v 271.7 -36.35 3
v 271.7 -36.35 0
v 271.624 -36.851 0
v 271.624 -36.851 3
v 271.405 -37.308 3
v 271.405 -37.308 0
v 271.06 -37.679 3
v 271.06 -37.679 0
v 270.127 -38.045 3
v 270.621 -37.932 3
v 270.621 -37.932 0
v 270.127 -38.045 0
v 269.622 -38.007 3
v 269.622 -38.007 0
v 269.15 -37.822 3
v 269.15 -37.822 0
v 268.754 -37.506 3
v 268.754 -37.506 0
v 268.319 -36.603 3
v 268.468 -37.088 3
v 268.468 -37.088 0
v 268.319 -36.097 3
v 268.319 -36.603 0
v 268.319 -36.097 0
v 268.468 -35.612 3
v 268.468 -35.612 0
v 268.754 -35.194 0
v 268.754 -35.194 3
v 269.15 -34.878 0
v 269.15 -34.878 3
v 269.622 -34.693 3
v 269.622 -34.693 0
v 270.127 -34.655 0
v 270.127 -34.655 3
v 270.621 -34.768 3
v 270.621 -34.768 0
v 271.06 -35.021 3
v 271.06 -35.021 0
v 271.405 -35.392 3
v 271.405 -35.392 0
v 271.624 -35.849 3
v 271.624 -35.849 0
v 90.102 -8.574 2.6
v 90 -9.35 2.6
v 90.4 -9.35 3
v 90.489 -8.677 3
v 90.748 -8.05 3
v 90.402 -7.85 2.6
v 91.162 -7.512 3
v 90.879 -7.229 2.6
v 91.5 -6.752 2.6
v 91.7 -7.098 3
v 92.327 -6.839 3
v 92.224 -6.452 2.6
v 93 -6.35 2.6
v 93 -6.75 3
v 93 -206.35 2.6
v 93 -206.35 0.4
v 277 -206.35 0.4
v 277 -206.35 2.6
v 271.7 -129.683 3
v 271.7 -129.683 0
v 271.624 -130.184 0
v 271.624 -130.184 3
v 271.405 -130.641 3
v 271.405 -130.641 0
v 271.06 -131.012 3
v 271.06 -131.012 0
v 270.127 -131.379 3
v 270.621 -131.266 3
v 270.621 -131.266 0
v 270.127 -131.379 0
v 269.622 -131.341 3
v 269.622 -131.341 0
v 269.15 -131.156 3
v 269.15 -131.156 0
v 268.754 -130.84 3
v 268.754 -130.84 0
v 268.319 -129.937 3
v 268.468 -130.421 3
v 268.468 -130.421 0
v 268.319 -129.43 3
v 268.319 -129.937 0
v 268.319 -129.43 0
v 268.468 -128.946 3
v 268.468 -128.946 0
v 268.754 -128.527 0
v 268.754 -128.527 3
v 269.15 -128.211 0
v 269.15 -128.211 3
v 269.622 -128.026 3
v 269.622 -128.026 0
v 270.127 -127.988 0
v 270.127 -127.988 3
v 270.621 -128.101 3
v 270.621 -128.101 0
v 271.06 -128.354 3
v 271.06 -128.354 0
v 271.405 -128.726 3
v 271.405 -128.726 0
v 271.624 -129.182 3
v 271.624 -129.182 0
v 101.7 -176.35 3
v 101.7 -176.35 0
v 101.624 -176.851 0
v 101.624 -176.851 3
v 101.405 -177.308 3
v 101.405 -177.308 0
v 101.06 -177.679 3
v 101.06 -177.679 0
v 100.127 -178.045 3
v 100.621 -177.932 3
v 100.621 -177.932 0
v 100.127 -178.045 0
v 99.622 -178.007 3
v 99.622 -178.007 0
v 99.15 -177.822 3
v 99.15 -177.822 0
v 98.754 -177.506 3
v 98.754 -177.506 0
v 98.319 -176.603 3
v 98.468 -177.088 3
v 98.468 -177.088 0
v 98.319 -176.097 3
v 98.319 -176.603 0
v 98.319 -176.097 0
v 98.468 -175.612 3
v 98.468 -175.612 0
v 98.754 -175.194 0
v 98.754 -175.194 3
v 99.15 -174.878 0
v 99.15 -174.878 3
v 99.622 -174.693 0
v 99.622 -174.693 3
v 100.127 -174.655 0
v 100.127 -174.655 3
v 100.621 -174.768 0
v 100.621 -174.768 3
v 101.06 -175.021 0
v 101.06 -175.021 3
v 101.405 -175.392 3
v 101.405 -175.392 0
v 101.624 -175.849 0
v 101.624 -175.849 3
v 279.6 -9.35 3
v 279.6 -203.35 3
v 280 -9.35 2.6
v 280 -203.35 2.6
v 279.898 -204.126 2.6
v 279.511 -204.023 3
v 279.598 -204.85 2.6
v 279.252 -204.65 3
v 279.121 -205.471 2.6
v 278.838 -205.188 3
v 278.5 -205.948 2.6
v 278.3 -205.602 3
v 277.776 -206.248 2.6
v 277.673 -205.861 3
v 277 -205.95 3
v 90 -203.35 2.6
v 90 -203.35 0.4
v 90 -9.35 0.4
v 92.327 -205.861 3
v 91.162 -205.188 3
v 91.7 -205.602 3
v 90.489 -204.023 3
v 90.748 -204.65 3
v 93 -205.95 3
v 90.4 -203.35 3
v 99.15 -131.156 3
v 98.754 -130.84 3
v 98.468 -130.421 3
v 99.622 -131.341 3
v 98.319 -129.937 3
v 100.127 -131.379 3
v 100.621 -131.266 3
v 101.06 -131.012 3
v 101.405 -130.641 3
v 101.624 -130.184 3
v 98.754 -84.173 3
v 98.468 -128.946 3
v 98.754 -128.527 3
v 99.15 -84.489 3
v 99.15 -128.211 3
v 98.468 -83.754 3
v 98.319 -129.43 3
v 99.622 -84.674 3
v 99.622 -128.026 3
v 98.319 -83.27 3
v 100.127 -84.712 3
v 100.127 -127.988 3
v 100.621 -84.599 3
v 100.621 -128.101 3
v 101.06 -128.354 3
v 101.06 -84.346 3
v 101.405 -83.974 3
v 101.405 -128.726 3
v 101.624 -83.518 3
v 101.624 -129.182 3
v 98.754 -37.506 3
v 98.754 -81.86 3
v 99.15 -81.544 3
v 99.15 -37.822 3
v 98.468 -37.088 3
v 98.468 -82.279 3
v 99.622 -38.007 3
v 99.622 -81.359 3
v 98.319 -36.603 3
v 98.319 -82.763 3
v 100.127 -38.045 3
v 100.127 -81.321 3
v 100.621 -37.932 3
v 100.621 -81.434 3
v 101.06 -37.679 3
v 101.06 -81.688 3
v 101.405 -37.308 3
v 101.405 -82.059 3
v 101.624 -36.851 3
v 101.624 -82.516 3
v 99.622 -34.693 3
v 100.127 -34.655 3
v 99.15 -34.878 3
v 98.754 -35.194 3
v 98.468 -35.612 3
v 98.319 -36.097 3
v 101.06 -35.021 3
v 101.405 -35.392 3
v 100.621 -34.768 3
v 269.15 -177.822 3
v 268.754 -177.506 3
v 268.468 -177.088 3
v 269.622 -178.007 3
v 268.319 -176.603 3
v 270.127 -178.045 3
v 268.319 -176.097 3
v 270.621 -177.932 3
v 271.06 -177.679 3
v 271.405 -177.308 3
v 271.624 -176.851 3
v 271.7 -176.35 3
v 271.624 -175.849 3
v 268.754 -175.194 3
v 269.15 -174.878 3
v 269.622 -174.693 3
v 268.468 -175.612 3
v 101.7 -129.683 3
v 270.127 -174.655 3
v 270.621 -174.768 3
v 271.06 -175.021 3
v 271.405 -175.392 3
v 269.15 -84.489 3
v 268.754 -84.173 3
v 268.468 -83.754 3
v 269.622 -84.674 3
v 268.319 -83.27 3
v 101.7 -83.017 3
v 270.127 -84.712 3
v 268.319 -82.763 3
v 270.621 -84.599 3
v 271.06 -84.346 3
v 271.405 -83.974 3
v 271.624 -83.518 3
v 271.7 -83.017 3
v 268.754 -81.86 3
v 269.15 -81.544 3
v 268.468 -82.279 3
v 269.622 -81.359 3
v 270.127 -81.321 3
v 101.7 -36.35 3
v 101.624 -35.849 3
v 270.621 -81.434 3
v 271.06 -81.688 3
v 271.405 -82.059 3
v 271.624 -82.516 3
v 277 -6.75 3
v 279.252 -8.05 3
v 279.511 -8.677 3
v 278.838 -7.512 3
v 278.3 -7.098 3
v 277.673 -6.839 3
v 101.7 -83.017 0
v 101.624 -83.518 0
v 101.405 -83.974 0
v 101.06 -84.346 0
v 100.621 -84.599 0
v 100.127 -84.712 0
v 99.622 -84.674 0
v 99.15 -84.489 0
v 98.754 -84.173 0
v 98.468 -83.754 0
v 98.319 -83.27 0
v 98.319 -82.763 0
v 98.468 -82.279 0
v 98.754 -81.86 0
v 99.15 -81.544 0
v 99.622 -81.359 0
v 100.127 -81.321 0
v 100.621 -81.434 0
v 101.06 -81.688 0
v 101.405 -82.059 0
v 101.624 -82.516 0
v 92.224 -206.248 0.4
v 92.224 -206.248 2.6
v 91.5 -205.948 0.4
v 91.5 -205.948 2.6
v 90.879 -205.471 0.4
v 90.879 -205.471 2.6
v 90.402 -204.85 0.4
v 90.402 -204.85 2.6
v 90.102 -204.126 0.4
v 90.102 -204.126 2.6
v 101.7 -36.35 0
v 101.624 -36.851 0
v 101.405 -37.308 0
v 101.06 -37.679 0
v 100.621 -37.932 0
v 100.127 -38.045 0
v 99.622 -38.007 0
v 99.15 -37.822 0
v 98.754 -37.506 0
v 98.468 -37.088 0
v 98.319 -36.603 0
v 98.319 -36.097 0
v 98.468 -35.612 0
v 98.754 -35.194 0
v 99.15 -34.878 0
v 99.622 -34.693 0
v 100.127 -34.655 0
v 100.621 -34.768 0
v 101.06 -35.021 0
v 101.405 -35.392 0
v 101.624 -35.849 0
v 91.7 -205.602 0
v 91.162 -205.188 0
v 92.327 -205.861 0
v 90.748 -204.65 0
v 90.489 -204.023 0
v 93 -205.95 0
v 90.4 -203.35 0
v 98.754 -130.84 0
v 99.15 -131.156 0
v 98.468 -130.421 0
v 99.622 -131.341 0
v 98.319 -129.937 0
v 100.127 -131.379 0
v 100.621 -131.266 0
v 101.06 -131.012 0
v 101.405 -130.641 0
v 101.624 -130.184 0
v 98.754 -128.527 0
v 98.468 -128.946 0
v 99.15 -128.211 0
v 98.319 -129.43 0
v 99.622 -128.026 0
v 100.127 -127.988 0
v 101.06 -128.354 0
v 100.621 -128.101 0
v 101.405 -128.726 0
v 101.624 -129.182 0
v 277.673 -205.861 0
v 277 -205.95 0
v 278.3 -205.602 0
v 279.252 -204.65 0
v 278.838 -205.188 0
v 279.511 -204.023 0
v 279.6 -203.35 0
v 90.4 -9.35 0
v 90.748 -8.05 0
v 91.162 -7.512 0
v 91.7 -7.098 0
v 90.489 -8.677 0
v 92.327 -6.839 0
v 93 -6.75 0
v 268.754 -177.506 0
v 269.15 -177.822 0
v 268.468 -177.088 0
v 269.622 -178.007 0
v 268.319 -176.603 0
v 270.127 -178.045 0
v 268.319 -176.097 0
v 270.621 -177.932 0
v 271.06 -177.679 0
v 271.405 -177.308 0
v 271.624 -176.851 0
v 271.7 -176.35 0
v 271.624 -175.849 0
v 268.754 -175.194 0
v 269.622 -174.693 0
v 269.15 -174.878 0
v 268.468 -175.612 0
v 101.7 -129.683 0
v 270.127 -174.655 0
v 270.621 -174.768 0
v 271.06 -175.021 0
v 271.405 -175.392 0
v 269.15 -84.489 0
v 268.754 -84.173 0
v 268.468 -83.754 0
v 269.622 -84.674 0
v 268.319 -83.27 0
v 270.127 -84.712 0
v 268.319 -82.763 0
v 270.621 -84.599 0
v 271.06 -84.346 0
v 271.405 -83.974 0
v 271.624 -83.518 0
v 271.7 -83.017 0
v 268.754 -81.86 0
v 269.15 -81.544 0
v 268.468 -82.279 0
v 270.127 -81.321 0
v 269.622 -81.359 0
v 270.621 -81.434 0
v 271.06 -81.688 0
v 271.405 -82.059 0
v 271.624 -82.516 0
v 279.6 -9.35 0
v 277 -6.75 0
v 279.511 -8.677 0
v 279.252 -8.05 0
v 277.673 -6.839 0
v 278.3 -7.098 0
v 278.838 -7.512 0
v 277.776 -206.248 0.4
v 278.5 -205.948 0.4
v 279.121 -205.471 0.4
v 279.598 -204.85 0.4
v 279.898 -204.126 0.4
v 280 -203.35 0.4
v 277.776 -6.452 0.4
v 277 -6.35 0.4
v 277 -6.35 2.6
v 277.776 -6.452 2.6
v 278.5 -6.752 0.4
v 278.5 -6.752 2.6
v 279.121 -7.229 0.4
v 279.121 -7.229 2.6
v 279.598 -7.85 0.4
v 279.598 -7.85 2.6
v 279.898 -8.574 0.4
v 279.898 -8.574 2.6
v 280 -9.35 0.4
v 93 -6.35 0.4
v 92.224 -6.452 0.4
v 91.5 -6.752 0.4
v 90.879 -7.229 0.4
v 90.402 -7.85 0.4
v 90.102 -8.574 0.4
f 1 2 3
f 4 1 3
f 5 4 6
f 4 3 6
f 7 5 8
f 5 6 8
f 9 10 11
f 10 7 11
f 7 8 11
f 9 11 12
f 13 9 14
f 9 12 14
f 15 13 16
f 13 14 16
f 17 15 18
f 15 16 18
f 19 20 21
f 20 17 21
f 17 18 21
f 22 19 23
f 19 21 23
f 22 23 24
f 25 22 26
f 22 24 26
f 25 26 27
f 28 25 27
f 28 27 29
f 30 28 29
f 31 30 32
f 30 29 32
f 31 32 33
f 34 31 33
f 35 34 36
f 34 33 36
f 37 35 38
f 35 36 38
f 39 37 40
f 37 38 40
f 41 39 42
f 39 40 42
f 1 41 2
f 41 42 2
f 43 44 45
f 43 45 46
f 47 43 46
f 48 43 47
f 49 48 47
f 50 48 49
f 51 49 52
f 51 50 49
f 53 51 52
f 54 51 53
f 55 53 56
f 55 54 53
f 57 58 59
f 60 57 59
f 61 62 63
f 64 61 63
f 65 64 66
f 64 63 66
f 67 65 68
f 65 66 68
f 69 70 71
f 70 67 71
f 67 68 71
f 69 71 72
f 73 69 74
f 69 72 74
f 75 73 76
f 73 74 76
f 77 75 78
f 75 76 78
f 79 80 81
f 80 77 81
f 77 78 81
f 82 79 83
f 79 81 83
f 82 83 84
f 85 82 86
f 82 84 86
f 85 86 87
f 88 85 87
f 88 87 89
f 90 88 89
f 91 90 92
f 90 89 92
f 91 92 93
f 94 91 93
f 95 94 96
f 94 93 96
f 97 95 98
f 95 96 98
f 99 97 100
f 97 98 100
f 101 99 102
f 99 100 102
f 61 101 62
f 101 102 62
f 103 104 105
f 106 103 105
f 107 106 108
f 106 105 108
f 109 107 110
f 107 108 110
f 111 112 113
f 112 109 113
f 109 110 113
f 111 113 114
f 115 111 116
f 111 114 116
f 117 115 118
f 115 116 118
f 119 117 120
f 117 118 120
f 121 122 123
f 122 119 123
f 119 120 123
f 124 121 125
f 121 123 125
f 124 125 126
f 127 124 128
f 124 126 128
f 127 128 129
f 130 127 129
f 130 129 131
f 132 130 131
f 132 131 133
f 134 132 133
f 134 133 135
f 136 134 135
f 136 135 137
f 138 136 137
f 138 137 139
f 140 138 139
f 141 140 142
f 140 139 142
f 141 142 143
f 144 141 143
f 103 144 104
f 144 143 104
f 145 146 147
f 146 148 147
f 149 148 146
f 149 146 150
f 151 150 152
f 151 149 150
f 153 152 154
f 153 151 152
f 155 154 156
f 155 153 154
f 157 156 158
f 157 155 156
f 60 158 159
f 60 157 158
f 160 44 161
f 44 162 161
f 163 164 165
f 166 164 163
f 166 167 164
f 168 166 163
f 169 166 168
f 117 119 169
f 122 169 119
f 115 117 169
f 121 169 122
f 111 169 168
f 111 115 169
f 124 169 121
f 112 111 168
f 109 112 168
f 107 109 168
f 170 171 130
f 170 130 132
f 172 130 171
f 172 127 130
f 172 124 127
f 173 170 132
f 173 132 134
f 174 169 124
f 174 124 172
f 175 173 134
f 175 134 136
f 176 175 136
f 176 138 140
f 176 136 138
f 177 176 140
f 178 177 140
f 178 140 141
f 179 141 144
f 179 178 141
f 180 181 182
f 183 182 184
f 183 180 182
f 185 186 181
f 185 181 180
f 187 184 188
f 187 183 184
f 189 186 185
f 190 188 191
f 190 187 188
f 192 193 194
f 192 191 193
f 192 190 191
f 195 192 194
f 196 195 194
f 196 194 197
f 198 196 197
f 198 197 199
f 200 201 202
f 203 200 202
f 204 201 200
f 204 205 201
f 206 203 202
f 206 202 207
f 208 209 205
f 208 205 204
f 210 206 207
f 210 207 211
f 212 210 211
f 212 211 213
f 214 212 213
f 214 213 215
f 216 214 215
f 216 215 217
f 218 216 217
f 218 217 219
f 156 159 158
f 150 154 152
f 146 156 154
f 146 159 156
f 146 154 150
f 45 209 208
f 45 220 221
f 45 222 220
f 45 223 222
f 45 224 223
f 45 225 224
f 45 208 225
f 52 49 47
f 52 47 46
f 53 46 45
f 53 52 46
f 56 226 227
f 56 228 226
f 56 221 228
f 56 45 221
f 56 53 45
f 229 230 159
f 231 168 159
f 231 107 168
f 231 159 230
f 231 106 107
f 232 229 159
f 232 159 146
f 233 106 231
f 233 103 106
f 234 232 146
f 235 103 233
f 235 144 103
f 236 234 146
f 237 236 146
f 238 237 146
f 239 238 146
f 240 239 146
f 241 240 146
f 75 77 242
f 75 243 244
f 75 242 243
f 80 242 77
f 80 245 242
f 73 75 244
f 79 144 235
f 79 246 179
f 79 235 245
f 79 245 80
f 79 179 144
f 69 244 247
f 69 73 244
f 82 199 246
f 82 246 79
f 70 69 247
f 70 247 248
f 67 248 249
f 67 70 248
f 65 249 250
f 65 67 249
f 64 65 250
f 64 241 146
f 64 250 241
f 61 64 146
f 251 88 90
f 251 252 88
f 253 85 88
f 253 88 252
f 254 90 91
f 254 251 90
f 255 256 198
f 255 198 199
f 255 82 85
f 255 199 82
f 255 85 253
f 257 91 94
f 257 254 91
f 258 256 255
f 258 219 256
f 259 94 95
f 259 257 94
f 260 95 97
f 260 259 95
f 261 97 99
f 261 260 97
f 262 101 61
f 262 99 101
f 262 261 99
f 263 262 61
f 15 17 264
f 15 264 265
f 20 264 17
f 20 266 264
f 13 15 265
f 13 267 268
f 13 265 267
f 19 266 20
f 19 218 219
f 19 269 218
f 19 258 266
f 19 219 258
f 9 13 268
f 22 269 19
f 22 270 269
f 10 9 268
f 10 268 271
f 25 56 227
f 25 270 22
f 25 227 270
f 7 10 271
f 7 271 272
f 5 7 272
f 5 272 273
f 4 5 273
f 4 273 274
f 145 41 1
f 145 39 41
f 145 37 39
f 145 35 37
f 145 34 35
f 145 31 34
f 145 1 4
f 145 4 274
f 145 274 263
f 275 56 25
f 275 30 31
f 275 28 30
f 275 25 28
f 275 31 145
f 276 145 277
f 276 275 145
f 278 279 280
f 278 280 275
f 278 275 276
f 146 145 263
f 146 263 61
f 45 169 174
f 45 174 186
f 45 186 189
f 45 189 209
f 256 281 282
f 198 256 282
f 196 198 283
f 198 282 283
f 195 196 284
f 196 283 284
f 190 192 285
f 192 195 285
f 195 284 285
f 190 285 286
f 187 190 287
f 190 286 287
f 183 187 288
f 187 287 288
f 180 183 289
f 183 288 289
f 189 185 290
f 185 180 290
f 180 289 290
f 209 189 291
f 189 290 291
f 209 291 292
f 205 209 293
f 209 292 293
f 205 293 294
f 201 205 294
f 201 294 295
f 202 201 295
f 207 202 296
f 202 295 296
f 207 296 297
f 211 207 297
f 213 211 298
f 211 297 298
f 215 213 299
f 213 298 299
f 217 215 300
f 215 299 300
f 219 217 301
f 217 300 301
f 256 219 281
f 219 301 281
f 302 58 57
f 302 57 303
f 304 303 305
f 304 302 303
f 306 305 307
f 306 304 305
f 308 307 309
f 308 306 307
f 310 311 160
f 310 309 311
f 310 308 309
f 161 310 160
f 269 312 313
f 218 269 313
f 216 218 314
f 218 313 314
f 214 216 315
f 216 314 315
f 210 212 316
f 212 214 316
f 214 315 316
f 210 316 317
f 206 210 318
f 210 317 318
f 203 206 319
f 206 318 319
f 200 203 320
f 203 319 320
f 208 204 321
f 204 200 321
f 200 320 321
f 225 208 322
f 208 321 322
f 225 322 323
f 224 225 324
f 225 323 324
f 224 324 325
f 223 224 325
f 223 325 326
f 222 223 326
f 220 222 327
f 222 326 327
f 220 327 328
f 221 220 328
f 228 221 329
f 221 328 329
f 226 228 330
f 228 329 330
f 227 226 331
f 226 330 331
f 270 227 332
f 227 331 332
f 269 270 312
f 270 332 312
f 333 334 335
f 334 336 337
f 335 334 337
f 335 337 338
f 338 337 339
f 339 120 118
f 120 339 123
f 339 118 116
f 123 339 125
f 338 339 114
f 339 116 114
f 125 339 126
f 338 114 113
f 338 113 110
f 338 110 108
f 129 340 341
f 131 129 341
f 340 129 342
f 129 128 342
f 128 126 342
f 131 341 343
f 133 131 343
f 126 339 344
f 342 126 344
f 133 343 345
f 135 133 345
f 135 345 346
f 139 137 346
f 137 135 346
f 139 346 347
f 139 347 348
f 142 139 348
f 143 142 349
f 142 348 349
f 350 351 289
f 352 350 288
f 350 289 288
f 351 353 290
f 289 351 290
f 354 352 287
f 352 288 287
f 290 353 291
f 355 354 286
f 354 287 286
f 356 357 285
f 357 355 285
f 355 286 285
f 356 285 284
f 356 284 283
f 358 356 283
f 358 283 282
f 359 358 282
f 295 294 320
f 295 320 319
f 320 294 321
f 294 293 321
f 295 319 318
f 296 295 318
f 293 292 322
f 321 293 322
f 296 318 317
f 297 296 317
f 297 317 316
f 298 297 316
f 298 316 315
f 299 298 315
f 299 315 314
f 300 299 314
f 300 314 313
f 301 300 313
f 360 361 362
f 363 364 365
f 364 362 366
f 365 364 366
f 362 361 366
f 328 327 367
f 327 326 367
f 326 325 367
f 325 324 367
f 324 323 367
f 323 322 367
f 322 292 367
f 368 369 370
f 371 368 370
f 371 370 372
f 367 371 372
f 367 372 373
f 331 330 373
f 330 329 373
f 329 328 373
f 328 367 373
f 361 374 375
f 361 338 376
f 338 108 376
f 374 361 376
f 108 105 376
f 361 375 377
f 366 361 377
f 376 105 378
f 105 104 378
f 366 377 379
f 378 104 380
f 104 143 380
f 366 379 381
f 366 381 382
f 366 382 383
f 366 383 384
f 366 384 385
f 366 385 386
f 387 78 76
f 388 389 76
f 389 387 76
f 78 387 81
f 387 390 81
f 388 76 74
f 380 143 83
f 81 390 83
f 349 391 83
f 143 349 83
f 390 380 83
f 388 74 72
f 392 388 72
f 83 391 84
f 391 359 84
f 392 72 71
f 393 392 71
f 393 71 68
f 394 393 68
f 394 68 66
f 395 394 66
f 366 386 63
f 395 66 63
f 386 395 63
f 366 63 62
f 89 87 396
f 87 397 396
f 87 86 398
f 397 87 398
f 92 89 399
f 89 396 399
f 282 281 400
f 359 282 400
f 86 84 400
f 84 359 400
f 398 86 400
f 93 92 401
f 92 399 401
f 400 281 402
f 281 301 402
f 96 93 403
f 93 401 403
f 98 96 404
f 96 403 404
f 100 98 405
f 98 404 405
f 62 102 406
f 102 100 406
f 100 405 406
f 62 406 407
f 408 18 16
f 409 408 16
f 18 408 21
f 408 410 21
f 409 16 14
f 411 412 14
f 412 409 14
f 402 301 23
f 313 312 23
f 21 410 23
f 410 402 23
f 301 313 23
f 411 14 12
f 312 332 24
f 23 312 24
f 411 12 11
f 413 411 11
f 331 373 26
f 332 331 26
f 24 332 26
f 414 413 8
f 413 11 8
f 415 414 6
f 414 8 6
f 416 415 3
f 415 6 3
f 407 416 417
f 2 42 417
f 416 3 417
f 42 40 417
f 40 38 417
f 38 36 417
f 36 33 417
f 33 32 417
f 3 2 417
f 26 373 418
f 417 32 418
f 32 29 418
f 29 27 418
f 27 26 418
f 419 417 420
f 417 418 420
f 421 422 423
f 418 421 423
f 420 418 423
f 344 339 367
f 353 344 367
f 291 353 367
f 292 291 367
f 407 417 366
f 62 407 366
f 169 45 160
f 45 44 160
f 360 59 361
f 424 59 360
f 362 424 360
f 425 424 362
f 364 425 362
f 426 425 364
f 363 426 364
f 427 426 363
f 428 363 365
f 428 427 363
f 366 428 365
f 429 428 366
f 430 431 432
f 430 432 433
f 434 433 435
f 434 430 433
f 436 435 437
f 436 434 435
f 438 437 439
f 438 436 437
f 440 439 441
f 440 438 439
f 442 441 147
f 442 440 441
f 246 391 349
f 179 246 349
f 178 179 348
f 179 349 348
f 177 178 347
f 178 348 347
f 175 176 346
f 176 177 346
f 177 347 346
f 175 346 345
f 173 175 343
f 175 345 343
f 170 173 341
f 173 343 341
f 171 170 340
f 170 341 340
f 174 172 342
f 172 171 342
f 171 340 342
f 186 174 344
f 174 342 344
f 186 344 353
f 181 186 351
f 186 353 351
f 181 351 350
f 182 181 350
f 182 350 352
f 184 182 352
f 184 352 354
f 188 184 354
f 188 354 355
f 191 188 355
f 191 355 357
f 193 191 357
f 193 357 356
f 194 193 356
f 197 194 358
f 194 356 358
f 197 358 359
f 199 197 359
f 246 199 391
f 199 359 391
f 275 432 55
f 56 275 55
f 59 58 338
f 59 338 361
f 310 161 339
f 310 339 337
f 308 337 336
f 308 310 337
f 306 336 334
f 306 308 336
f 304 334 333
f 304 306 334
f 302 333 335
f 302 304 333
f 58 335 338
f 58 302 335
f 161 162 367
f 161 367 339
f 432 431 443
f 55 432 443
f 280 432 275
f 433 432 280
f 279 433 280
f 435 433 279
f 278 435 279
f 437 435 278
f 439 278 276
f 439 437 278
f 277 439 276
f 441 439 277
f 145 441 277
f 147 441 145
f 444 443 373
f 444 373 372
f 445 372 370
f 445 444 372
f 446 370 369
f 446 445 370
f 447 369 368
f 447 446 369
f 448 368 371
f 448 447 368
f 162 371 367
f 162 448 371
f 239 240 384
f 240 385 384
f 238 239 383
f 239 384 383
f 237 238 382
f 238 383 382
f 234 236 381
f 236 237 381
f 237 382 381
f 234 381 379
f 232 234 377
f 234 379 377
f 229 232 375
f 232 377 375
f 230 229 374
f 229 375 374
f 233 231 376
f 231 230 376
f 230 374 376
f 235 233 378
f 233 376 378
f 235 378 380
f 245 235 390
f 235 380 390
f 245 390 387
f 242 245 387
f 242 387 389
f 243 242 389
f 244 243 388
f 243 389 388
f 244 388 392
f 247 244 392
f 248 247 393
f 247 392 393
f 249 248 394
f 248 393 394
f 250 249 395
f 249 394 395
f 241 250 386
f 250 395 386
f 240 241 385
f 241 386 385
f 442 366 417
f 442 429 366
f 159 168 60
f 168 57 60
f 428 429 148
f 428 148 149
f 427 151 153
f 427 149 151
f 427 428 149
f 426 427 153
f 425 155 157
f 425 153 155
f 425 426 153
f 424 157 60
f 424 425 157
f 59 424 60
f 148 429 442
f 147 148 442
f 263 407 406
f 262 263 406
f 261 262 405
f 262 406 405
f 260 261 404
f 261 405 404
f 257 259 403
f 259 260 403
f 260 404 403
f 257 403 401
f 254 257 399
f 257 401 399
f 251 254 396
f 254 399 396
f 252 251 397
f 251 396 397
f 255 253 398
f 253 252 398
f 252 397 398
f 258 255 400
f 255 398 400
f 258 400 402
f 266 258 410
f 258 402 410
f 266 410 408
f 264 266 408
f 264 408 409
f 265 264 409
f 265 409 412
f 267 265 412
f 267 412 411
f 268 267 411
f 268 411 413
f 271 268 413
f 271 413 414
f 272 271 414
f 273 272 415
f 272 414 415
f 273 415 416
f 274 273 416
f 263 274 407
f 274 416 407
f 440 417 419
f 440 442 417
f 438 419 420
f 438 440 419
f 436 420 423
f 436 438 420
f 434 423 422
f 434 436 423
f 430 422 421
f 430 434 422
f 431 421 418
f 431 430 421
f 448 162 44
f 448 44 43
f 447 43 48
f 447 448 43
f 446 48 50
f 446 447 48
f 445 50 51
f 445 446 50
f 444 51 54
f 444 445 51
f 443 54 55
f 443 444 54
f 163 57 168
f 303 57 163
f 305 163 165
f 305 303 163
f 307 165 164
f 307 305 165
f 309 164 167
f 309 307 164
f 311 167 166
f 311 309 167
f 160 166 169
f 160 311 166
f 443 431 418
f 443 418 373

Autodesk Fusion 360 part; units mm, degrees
sketch "Sketch1" plane through (0, 0, 0) normal (0, 0, 1) x (1, 0, 0)
  line L0 (90, -6.35) -> (90, -206.35)
  line L1 (280, -206.35) -> (280, -6.35)
  line L2 (90, -206.35) -> (280, -206.35)
  line L3 (280, -6.35) -> (90, -6.35)
  line L4 (100, -6.35) -> (100, -206.35) construction
  line L5 (185, -6.35) -> (185, -206.35)
  circle A0 centre (100, -176.35) radius 1.7
  circle A1 centre (100, -129.6833) radius 1.7
  circle A2 centre (100, -83.0167) radius 1.7
  circle A3 centre (100, -36.35) radius 1.7
  circle A4 centre (270, -176.35) radius 1.7
  circle A5 centre (270, -129.6833) radius 1.7
  circle A6 centre (270, -83.0167) radius 1.7
  circle A7 centre (270, -36.35) radius 1.7
  circle A8 centre (93, -203.35) radius 3
  circle A9 centre (93, -9.35) radius 3
  circle A10 centre (277, -9.35) radius 3
  circle A11 centre (277, -203.35) radius 3
  dimension "d3694" = 200
  dimension "d3695" = 90
  dimension "d3696" = 6.35
  dimension "d3697" = 190
  dimension "d3698" = 100
  dimension "d3699" = 3.4
  dimension "d3700" = 30
  dimension "d3701" = 30
  dimension "d3702" = 46.6667
  dimension "d3703" = 46.6667
  dimension "d3706" = 6
extrude "Extrude1" add sketch "Sketch1" along normal blind 3 contours L0 L2 L3 L5 A8 A9 | A9 | A8 | L1 L2 L3 L5 A10 A11 | A10 | A11
sketch "DXF" plane through (0, 0, 3) normal (0, 0, 1) x (-1, 0, 0)
  circle A0 centre (-270, 176.35) radius 1.7
  circle A1 centre (-100, 36.35) radius 1.7
  circle A2 centre (-270, 36.35) radius 1.7
  circle A3 centre (-100, 83.0167) radius 1.7
  circle A4 centre (-100, 176.35) radius 1.7
  circle A5 centre (-270, 83.0167) radius 1.7
  circle A6 centre (-100, 129.6833) radius 1.7
  circle A7 centre (-270, 129.6833) radius 1.7
  line L0 (-93, 206.35) -> (-277, 206.35)
  arc A8 (-277, 206.35) -> (-280, 203.35) centre (-277, 203.35) ccw
  line L1 (-280, 203.35) -> (-280, 9.35)
  arc A9 (-280, 9.35) -> (-277, 6.35) centre (-277, 9.35) ccw
  line L2 (-277, 6.35) -> (-93, 6.35)
  arc A10 (-93, 6.35) -> (-90, 9.35) centre (-93, 9.35) ccw
  line L3 (-90, 9.35) -> (-90, 203.35)
  arc A11 (-90, 203.35) -> (-93, 206.35) centre (-93, 203.35) ccw
chamfer "Chamfer1" distance 0.4 angle 45 16 edges at (280, -106.35, 0) (279.1213, -7.2287, 0) (185, -6.35, 0) (90.8787, -7.2287, 0) (90, -106.35, 0) (90.8787, -205.4713, 0) (185, -206.35, 0) (279.1213, -205.4713, 0) (280, -106.35, 3) (279.1213, -7.2287, 3) (185, -6.35, 3) (90.8787, -7.2287, 3) (90, -106.35, 3) (90.8787, -205.4713, 3) (185, -206.35, 3) (279.1213, -205.4713, 3)
equation "d3694 = 204 mm - 3 mm - 1 mm"
equation "d3696 = 5.35 mm + 1 mm"
equation "d3698 = 85 mm + 15 mm"
equation "d3702 = ( d3694 - ( d3700 * 2 ) ) / 3"
equation "d3703 = d3702"
